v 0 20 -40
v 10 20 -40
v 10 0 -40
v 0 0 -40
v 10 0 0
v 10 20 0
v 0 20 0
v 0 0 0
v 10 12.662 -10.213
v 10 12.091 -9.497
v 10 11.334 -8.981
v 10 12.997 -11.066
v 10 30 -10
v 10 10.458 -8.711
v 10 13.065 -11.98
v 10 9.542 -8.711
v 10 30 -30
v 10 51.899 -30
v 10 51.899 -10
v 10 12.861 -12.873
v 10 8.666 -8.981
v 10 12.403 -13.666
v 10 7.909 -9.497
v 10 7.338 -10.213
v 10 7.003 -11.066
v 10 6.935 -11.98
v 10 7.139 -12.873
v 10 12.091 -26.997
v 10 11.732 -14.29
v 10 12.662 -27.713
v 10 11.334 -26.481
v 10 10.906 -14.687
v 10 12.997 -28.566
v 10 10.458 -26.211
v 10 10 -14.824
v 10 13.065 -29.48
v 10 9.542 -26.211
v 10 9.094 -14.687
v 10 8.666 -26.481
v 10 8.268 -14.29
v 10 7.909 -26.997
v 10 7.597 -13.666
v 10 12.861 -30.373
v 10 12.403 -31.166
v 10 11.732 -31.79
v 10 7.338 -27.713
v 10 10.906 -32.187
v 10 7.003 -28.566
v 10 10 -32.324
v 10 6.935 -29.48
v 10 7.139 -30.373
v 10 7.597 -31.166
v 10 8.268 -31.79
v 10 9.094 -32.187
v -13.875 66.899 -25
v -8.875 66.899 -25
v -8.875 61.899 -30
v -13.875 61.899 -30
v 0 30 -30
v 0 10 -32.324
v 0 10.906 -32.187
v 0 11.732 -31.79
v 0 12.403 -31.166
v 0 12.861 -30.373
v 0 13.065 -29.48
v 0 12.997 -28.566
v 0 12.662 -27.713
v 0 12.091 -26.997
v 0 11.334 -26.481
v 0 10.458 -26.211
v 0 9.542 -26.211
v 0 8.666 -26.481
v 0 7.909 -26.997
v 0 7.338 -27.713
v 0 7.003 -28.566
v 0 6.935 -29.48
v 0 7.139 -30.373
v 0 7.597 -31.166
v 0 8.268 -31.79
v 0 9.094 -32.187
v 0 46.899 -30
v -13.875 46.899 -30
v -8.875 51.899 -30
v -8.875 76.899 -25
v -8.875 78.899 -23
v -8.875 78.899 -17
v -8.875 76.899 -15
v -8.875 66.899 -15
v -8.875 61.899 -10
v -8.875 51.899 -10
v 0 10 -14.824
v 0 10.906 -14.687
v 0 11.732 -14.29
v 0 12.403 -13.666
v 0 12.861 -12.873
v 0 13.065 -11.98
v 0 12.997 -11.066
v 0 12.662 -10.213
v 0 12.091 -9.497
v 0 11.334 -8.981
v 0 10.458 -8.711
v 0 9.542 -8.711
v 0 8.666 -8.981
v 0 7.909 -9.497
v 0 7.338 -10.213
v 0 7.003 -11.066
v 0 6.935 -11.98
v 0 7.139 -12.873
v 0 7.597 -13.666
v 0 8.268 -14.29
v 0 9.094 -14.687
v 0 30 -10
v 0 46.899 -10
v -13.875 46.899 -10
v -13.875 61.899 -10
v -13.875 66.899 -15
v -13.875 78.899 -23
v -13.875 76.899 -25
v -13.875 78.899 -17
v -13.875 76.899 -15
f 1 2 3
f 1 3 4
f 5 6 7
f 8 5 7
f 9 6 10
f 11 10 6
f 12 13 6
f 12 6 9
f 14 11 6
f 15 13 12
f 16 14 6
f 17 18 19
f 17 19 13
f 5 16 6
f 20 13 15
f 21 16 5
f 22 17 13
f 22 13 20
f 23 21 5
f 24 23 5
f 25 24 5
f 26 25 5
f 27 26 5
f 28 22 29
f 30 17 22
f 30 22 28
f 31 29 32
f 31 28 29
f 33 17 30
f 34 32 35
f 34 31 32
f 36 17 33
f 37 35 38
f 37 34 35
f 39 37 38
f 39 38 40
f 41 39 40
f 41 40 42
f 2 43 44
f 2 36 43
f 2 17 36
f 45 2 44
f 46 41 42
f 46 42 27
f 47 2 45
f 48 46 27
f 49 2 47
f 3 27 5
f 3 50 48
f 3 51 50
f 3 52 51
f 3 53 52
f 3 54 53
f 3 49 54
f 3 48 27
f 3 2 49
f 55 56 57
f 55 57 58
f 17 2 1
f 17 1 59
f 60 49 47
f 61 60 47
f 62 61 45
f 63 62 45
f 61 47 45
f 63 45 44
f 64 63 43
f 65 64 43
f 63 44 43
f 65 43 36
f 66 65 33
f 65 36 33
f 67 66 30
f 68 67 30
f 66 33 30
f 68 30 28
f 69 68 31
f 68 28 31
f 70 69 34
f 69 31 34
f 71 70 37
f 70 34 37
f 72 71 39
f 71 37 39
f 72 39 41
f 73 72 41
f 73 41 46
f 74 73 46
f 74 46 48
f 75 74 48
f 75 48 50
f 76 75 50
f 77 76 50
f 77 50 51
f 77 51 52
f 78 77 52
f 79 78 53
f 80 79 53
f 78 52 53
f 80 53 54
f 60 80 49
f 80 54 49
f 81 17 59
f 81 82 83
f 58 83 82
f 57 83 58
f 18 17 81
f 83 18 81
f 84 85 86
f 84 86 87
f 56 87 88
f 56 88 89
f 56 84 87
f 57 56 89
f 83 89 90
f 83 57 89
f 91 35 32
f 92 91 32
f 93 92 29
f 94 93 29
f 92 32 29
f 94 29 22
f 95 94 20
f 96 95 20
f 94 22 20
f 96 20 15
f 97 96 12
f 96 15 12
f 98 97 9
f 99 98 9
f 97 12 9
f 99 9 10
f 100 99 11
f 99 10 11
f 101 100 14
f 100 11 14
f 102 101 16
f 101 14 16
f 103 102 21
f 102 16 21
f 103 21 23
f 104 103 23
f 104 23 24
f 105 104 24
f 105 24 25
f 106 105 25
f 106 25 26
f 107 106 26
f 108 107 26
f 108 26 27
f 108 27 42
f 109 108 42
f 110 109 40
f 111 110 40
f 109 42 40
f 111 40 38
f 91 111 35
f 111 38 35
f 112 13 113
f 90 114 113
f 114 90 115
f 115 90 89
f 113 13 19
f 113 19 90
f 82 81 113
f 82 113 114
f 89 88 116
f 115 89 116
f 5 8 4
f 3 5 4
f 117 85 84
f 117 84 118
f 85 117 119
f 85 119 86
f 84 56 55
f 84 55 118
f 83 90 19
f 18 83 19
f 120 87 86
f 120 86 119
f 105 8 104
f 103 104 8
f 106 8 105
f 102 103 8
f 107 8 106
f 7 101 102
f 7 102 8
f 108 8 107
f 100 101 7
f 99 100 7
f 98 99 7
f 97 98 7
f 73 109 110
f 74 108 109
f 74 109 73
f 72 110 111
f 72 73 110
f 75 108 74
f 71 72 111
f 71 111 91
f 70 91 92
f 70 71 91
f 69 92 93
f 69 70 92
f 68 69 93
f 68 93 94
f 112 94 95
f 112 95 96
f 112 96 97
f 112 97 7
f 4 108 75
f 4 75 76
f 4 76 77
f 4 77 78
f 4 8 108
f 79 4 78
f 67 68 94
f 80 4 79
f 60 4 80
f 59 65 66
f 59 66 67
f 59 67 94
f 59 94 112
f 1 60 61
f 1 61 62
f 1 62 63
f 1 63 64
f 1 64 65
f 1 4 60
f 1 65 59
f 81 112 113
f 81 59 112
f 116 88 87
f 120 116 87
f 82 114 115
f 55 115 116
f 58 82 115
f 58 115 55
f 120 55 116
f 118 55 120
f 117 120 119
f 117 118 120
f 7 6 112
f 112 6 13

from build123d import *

# Parameters (mm, degrees)
SKETCH_1_W          = 40
SKETCH_1_H          = 20
EXTRUDE_1_DEPTH     = 10
SKETCH_2_R          = 3.07375
CUT_EXTRUDE_1_DEPTH = 10
EXTRUDE_2_DEPTH     = 40
CUT_EXTRUDE_2_DEPTH = 92.624619881
SKETCH_5_W          = 5
SKETCH_5_H          = 17
CUT_EXTRUDE_3_DEPTH = 91.450654881
CHAMFER_1_SIZE      = 5
CHAMFER_2_SIZE      = 2


with BuildPart() as part:
    # 草图1 → 凸台-拉伸1 (new body)
    with BuildSketch(Plane(origin=(0, 0, 0), x_dir=(0, 0, -1), z_dir=(1, 0, 0))):
        with Locations((20, 10)):
            Rectangle(SKETCH_1_W, SKETCH_1_H)
    extrude(amount=EXTRUDE_1_DEPTH)

    # 草图2 → 切除-拉伸1 (cut)
    with BuildSketch(Plane(origin=(10, 0, 0), x_dir=(0, 0, -1), z_dir=(1, 0, 0))):
        with Locations((11.75, 10)):
            Circle(SKETCH_2_R)
        with Locations((29.25, 10)):
            Circle(SKETCH_2_R)
    extrude(amount=-CUT_EXTRUDE_1_DEPTH, mode=Mode.SUBTRACT)

    # 草图3 → 凸台-拉伸2 (add)
    with BuildSketch(Plane(origin=(0, 0, -40), x_dir=(-1, 0, 0), z_dir=(0, 0, -1))):
        Polygon((0, 20), (0, 46.899019914), (13.875, 46.899019914), (13.875, 78.899019914), (8.875, 78.899019914), (8.875, 51.899019914), (-10, 51.899019914), (-10, 20), align=None)
    extrude(amount=-EXTRUDE_2_DEPTH)

    # 草图4 → 切除-拉伸2 (cut, through all)
    with BuildSketch(Plane(origin=(10, 0, 0), x_dir=(0, 0, -1), z_dir=(1, 0, 0))):
        Polygon((30, 30), (30, 88.448191602), (51.195528036, 88.448191602), (51.195528036, 8.804471964), align=None)
        Polygon((10, 30), (10, 90.801384447), (0, 90.801384447), (0, 20), align=None)
    extrude(amount=-CUT_EXTRUDE_2_DEPTH, mode=Mode.SUBTRACT)

    # 草图5 → 切除-拉伸3 (cut, through all)
    with BuildSketch(Plane(origin=(-8.875, 0, 0), x_dir=(0, 0, -1), z_dir=(1, 0, 0))):
        with Locations((12.5, 70.399019914)):
            Rectangle(SKETCH_5_W, SKETCH_5_H)
        with Locations((27.5, 70.399019914)):
            Rectangle(SKETCH_5_W, SKETCH_5_H)
    extrude(amount=-CUT_EXTRUDE_3_DEPTH, mode=Mode.SUBTRACT)

    # 倒角1
    chamfer_1_edges = [part.edges().sort_by_distance(p)[0] for p in [
        (-11.375, 61.899019914, -25),
        (-11.375, 61.899019914, -15),
    ]]
    chamfer(chamfer_1_edges, length=CHAMFER_1_SIZE - 0.0001)  # a hair under: the kernel refuses the full size

    # 倒角2
    chamfer_2_edges = [part.edges().sort_by_distance(p)[0] for p in [
        (-11.375, 78.899019914, -15),
        (-11.375, 78.899019914, -25),
    ]]
    chamfer(chamfer_2_edges, length=CHAMFER_2_SIZE)


solid = part.part
